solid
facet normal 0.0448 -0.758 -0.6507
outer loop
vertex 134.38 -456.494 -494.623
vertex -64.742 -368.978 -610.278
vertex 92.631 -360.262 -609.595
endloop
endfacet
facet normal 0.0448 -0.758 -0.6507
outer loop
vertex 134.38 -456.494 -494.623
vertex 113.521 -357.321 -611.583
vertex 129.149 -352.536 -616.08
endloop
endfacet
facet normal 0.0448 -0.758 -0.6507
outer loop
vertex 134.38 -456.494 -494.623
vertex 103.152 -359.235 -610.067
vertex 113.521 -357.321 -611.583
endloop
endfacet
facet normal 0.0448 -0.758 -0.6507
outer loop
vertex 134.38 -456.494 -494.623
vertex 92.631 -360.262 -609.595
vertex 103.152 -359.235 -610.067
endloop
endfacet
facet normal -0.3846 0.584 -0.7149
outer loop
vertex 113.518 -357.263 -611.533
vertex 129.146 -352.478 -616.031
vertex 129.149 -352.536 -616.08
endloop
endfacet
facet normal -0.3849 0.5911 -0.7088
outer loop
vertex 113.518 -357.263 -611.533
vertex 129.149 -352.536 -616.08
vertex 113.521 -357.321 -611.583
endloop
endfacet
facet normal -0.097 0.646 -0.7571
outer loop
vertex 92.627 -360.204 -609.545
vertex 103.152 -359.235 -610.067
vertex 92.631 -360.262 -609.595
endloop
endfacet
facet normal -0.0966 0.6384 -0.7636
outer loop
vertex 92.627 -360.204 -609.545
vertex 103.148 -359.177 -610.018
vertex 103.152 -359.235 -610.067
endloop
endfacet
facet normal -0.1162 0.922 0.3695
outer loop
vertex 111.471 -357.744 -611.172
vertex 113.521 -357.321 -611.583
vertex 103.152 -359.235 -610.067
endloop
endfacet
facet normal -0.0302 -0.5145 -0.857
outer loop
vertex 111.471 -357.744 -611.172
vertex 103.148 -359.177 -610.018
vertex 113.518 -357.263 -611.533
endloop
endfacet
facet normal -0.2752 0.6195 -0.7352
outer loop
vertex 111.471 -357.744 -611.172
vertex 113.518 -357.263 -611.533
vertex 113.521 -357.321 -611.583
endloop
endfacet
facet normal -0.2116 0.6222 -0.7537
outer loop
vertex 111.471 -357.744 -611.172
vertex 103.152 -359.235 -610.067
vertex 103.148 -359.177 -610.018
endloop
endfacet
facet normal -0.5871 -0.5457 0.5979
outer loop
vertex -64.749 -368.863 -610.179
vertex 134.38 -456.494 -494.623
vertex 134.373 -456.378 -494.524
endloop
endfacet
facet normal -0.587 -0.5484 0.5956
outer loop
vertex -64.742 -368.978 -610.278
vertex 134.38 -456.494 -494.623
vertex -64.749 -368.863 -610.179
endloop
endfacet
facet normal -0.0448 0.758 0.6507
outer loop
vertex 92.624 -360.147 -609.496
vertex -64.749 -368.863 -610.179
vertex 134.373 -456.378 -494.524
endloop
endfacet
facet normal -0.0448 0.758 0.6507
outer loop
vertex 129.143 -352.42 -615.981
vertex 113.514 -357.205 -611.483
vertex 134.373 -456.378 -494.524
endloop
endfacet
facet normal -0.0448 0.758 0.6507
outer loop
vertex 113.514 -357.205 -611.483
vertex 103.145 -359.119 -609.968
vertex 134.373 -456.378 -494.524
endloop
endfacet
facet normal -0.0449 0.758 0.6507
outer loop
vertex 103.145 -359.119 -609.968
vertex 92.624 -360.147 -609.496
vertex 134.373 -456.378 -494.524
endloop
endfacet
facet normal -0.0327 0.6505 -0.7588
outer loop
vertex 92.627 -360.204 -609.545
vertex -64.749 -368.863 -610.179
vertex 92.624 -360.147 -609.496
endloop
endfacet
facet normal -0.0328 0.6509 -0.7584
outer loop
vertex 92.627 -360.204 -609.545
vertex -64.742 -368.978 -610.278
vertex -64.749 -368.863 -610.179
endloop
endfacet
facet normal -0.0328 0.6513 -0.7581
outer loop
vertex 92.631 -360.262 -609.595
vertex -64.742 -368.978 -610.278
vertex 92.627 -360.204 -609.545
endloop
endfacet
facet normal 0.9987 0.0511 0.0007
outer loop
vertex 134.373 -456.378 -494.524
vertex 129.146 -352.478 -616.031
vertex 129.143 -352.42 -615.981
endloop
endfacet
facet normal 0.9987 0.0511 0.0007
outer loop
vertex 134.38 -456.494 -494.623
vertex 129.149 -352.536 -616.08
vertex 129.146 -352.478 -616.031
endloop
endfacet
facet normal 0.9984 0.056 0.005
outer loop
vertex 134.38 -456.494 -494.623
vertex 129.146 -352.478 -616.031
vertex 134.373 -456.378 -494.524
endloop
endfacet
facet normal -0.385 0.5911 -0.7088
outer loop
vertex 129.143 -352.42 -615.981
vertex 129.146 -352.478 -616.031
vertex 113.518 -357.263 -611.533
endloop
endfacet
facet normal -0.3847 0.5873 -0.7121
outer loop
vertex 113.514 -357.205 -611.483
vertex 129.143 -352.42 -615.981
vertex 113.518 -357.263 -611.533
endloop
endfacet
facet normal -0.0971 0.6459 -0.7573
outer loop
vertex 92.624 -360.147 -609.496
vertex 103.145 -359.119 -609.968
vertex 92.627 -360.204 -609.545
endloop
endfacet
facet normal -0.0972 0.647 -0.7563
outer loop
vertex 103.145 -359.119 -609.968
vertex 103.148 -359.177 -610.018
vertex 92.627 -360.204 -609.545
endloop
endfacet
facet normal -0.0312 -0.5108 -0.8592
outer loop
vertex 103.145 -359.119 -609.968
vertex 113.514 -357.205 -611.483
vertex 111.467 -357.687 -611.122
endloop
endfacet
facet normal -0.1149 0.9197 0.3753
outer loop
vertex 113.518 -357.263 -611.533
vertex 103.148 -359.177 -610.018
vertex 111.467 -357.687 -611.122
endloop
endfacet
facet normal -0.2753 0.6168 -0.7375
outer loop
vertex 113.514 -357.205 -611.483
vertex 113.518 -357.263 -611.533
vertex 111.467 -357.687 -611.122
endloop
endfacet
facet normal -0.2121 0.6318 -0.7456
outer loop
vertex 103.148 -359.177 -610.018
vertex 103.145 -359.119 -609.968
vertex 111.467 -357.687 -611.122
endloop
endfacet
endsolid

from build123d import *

# Parameters (mm, degrees)
BOSS_EXTRUDE1_DEPTH = 0.0762


with BuildPart() as part:
    # Sketch2 → Boss-Extrude1 (new, symmetric)
    with BuildSketch(Plane(origin=(-109.649906409, -282.836957695, -713.595872526), x_dir=(0.998460453708484, 0.05529862010587768, 0.004334165967541292), z_dir=(0.04480550370073853, -0.7579973701260059, -0.6507168767752854))):
        with BuildLine():
            Line((40.522667634, 135.902493489), (198.13852487, 135.902493489))
            add(Edge.make_bspline(
                [(235, 127.150580223), (217.608315086, 135.902493489), (198.13852487, 135.902493489)],
                knots=[1.10455701, 1.10455701, 1.10455701, 1.570796327, 1.570796327, 1.570796327], degree=2, weights=[1, 0.972950446, 1]))
            Line((235, 127.150580223), (235, 287.108094093))
            Line((235, 287.108094093), (40.522667634, 135.902493489))
        make_face()
    extrude(amount=BOSS_EXTRUDE1_DEPTH, both=True)


solid = part.part
